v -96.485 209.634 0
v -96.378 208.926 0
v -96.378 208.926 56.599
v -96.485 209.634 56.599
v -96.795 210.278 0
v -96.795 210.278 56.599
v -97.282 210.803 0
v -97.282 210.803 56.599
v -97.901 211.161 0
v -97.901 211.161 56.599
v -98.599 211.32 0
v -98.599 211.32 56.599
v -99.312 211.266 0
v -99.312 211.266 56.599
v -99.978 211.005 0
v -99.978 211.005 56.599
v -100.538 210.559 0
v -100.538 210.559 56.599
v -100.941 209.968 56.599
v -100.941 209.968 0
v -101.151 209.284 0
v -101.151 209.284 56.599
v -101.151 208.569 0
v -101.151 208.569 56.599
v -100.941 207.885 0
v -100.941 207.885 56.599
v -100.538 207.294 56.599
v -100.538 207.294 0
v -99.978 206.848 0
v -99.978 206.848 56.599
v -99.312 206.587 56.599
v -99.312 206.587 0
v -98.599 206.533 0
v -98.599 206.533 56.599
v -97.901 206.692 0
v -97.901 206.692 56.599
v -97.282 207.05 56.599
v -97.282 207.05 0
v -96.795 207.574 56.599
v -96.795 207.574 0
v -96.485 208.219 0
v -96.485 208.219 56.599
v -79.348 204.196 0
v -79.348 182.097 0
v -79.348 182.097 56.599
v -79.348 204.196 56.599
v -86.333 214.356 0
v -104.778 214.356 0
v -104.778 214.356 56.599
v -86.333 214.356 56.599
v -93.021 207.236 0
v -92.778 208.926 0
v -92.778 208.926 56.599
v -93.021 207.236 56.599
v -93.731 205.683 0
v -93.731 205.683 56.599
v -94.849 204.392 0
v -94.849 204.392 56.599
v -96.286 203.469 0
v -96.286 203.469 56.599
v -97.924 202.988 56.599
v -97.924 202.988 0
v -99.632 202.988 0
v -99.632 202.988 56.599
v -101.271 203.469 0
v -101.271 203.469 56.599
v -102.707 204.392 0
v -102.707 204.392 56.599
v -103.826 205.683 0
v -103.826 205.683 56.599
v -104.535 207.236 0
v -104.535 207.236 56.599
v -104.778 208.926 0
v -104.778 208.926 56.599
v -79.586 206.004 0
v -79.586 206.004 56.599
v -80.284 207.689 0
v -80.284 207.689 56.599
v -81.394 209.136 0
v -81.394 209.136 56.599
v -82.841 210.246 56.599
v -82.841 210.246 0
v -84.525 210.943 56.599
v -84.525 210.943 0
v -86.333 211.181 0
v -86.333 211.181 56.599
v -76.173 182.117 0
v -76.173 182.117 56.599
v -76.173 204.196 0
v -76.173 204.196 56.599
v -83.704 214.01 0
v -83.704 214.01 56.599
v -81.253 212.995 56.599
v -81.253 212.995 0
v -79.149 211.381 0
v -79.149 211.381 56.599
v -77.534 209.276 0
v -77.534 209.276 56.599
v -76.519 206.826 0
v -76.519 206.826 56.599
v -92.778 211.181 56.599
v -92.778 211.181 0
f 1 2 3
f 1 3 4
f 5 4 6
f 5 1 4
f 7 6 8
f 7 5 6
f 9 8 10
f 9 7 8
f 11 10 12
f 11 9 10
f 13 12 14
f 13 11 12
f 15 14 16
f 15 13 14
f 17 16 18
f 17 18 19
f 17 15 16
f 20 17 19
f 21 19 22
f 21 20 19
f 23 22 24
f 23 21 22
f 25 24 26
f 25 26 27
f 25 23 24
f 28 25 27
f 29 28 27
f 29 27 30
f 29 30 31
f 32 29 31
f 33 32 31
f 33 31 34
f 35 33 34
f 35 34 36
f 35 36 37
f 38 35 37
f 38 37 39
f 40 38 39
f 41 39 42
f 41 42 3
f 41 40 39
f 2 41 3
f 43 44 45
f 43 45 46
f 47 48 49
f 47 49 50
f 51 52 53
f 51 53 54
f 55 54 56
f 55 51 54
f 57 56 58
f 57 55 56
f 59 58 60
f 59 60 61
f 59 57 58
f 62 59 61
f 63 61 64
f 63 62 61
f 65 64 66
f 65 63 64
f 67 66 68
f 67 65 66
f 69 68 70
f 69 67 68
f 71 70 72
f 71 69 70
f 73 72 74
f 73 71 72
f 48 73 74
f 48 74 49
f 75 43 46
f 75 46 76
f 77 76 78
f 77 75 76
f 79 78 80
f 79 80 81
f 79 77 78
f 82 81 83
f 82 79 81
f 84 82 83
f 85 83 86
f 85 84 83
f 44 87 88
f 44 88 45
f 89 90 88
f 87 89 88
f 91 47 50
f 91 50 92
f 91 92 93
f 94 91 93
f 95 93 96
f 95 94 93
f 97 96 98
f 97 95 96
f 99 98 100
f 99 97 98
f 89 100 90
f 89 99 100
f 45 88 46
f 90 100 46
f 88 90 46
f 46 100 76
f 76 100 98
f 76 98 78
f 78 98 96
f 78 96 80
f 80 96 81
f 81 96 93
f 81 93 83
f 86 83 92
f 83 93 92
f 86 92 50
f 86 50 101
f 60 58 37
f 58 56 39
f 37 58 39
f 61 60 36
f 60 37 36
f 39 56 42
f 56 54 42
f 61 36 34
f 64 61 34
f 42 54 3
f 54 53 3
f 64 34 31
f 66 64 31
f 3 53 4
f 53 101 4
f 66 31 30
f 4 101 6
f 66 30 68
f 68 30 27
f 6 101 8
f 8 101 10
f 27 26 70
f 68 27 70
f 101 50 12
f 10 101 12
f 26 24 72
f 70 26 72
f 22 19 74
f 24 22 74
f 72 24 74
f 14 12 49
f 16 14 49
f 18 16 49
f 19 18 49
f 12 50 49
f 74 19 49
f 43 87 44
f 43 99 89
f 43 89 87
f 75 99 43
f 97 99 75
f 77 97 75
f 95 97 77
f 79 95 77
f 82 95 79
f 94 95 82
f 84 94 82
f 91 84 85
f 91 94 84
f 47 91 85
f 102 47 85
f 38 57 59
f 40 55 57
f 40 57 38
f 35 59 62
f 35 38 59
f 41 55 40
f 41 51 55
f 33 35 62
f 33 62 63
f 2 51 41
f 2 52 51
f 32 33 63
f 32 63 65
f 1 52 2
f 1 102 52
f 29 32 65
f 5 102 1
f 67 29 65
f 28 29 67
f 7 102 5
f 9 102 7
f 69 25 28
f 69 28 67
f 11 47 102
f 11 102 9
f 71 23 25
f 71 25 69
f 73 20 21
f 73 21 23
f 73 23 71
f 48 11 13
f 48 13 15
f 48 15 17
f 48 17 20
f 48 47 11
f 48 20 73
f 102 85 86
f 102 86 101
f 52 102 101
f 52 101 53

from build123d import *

# Parameters (mm, degrees)
SKETCH1_R           = 2.4
BOSS_EXTRUDE1_DEPTH = 56.59882


with BuildPart() as part:
    # Sketch1 → Boss-Extrude1 (new body)
    with BuildSketch(Plane.XY):
        with BuildLine():
            Line((-76.173191063, 182.117156823), (-79.348191063, 182.096951811))
            Line((-79.348191063, 182.096951811), (-79.348191063, 204.196458108))
            ThreePointArc((-79.348191063, 204.196458108), (-81.394050197, 209.135598974), (-86.333191063, 211.181458108))
            Line((-86.333191063, 211.181458108), (-92.778191065, 211.181458108))
            Line((-92.778191065, 211.181458108), (-92.778191065, 208.926458108))
            ThreePointArc((-92.778191065, 208.926458108), (-98.778191065, 202.926458108), (-104.778191065, 208.926458108))
            Line((-104.778191065, 208.926458108), (-104.778191065, 214.356458108))
            Line((-104.778191065, 214.356458108), (-92.778191065, 214.356458108))
            Line((-92.778191065, 214.356458108), (-86.333191063, 214.356458108))
            ThreePointArc((-86.333191063, 214.356458108), (-79.148986166, 211.380663005), (-76.173191063, 204.196458108))
            Line((-76.173191063, 204.196458108), (-76.173191063, 182.117156823))
        make_face()
        with Locations((-98.778191065, 208.926458108)):
            Circle(SKETCH1_R, mode=Mode.SUBTRACT)
    extrude(amount=BOSS_EXTRUDE1_DEPTH)


solid = part.part
